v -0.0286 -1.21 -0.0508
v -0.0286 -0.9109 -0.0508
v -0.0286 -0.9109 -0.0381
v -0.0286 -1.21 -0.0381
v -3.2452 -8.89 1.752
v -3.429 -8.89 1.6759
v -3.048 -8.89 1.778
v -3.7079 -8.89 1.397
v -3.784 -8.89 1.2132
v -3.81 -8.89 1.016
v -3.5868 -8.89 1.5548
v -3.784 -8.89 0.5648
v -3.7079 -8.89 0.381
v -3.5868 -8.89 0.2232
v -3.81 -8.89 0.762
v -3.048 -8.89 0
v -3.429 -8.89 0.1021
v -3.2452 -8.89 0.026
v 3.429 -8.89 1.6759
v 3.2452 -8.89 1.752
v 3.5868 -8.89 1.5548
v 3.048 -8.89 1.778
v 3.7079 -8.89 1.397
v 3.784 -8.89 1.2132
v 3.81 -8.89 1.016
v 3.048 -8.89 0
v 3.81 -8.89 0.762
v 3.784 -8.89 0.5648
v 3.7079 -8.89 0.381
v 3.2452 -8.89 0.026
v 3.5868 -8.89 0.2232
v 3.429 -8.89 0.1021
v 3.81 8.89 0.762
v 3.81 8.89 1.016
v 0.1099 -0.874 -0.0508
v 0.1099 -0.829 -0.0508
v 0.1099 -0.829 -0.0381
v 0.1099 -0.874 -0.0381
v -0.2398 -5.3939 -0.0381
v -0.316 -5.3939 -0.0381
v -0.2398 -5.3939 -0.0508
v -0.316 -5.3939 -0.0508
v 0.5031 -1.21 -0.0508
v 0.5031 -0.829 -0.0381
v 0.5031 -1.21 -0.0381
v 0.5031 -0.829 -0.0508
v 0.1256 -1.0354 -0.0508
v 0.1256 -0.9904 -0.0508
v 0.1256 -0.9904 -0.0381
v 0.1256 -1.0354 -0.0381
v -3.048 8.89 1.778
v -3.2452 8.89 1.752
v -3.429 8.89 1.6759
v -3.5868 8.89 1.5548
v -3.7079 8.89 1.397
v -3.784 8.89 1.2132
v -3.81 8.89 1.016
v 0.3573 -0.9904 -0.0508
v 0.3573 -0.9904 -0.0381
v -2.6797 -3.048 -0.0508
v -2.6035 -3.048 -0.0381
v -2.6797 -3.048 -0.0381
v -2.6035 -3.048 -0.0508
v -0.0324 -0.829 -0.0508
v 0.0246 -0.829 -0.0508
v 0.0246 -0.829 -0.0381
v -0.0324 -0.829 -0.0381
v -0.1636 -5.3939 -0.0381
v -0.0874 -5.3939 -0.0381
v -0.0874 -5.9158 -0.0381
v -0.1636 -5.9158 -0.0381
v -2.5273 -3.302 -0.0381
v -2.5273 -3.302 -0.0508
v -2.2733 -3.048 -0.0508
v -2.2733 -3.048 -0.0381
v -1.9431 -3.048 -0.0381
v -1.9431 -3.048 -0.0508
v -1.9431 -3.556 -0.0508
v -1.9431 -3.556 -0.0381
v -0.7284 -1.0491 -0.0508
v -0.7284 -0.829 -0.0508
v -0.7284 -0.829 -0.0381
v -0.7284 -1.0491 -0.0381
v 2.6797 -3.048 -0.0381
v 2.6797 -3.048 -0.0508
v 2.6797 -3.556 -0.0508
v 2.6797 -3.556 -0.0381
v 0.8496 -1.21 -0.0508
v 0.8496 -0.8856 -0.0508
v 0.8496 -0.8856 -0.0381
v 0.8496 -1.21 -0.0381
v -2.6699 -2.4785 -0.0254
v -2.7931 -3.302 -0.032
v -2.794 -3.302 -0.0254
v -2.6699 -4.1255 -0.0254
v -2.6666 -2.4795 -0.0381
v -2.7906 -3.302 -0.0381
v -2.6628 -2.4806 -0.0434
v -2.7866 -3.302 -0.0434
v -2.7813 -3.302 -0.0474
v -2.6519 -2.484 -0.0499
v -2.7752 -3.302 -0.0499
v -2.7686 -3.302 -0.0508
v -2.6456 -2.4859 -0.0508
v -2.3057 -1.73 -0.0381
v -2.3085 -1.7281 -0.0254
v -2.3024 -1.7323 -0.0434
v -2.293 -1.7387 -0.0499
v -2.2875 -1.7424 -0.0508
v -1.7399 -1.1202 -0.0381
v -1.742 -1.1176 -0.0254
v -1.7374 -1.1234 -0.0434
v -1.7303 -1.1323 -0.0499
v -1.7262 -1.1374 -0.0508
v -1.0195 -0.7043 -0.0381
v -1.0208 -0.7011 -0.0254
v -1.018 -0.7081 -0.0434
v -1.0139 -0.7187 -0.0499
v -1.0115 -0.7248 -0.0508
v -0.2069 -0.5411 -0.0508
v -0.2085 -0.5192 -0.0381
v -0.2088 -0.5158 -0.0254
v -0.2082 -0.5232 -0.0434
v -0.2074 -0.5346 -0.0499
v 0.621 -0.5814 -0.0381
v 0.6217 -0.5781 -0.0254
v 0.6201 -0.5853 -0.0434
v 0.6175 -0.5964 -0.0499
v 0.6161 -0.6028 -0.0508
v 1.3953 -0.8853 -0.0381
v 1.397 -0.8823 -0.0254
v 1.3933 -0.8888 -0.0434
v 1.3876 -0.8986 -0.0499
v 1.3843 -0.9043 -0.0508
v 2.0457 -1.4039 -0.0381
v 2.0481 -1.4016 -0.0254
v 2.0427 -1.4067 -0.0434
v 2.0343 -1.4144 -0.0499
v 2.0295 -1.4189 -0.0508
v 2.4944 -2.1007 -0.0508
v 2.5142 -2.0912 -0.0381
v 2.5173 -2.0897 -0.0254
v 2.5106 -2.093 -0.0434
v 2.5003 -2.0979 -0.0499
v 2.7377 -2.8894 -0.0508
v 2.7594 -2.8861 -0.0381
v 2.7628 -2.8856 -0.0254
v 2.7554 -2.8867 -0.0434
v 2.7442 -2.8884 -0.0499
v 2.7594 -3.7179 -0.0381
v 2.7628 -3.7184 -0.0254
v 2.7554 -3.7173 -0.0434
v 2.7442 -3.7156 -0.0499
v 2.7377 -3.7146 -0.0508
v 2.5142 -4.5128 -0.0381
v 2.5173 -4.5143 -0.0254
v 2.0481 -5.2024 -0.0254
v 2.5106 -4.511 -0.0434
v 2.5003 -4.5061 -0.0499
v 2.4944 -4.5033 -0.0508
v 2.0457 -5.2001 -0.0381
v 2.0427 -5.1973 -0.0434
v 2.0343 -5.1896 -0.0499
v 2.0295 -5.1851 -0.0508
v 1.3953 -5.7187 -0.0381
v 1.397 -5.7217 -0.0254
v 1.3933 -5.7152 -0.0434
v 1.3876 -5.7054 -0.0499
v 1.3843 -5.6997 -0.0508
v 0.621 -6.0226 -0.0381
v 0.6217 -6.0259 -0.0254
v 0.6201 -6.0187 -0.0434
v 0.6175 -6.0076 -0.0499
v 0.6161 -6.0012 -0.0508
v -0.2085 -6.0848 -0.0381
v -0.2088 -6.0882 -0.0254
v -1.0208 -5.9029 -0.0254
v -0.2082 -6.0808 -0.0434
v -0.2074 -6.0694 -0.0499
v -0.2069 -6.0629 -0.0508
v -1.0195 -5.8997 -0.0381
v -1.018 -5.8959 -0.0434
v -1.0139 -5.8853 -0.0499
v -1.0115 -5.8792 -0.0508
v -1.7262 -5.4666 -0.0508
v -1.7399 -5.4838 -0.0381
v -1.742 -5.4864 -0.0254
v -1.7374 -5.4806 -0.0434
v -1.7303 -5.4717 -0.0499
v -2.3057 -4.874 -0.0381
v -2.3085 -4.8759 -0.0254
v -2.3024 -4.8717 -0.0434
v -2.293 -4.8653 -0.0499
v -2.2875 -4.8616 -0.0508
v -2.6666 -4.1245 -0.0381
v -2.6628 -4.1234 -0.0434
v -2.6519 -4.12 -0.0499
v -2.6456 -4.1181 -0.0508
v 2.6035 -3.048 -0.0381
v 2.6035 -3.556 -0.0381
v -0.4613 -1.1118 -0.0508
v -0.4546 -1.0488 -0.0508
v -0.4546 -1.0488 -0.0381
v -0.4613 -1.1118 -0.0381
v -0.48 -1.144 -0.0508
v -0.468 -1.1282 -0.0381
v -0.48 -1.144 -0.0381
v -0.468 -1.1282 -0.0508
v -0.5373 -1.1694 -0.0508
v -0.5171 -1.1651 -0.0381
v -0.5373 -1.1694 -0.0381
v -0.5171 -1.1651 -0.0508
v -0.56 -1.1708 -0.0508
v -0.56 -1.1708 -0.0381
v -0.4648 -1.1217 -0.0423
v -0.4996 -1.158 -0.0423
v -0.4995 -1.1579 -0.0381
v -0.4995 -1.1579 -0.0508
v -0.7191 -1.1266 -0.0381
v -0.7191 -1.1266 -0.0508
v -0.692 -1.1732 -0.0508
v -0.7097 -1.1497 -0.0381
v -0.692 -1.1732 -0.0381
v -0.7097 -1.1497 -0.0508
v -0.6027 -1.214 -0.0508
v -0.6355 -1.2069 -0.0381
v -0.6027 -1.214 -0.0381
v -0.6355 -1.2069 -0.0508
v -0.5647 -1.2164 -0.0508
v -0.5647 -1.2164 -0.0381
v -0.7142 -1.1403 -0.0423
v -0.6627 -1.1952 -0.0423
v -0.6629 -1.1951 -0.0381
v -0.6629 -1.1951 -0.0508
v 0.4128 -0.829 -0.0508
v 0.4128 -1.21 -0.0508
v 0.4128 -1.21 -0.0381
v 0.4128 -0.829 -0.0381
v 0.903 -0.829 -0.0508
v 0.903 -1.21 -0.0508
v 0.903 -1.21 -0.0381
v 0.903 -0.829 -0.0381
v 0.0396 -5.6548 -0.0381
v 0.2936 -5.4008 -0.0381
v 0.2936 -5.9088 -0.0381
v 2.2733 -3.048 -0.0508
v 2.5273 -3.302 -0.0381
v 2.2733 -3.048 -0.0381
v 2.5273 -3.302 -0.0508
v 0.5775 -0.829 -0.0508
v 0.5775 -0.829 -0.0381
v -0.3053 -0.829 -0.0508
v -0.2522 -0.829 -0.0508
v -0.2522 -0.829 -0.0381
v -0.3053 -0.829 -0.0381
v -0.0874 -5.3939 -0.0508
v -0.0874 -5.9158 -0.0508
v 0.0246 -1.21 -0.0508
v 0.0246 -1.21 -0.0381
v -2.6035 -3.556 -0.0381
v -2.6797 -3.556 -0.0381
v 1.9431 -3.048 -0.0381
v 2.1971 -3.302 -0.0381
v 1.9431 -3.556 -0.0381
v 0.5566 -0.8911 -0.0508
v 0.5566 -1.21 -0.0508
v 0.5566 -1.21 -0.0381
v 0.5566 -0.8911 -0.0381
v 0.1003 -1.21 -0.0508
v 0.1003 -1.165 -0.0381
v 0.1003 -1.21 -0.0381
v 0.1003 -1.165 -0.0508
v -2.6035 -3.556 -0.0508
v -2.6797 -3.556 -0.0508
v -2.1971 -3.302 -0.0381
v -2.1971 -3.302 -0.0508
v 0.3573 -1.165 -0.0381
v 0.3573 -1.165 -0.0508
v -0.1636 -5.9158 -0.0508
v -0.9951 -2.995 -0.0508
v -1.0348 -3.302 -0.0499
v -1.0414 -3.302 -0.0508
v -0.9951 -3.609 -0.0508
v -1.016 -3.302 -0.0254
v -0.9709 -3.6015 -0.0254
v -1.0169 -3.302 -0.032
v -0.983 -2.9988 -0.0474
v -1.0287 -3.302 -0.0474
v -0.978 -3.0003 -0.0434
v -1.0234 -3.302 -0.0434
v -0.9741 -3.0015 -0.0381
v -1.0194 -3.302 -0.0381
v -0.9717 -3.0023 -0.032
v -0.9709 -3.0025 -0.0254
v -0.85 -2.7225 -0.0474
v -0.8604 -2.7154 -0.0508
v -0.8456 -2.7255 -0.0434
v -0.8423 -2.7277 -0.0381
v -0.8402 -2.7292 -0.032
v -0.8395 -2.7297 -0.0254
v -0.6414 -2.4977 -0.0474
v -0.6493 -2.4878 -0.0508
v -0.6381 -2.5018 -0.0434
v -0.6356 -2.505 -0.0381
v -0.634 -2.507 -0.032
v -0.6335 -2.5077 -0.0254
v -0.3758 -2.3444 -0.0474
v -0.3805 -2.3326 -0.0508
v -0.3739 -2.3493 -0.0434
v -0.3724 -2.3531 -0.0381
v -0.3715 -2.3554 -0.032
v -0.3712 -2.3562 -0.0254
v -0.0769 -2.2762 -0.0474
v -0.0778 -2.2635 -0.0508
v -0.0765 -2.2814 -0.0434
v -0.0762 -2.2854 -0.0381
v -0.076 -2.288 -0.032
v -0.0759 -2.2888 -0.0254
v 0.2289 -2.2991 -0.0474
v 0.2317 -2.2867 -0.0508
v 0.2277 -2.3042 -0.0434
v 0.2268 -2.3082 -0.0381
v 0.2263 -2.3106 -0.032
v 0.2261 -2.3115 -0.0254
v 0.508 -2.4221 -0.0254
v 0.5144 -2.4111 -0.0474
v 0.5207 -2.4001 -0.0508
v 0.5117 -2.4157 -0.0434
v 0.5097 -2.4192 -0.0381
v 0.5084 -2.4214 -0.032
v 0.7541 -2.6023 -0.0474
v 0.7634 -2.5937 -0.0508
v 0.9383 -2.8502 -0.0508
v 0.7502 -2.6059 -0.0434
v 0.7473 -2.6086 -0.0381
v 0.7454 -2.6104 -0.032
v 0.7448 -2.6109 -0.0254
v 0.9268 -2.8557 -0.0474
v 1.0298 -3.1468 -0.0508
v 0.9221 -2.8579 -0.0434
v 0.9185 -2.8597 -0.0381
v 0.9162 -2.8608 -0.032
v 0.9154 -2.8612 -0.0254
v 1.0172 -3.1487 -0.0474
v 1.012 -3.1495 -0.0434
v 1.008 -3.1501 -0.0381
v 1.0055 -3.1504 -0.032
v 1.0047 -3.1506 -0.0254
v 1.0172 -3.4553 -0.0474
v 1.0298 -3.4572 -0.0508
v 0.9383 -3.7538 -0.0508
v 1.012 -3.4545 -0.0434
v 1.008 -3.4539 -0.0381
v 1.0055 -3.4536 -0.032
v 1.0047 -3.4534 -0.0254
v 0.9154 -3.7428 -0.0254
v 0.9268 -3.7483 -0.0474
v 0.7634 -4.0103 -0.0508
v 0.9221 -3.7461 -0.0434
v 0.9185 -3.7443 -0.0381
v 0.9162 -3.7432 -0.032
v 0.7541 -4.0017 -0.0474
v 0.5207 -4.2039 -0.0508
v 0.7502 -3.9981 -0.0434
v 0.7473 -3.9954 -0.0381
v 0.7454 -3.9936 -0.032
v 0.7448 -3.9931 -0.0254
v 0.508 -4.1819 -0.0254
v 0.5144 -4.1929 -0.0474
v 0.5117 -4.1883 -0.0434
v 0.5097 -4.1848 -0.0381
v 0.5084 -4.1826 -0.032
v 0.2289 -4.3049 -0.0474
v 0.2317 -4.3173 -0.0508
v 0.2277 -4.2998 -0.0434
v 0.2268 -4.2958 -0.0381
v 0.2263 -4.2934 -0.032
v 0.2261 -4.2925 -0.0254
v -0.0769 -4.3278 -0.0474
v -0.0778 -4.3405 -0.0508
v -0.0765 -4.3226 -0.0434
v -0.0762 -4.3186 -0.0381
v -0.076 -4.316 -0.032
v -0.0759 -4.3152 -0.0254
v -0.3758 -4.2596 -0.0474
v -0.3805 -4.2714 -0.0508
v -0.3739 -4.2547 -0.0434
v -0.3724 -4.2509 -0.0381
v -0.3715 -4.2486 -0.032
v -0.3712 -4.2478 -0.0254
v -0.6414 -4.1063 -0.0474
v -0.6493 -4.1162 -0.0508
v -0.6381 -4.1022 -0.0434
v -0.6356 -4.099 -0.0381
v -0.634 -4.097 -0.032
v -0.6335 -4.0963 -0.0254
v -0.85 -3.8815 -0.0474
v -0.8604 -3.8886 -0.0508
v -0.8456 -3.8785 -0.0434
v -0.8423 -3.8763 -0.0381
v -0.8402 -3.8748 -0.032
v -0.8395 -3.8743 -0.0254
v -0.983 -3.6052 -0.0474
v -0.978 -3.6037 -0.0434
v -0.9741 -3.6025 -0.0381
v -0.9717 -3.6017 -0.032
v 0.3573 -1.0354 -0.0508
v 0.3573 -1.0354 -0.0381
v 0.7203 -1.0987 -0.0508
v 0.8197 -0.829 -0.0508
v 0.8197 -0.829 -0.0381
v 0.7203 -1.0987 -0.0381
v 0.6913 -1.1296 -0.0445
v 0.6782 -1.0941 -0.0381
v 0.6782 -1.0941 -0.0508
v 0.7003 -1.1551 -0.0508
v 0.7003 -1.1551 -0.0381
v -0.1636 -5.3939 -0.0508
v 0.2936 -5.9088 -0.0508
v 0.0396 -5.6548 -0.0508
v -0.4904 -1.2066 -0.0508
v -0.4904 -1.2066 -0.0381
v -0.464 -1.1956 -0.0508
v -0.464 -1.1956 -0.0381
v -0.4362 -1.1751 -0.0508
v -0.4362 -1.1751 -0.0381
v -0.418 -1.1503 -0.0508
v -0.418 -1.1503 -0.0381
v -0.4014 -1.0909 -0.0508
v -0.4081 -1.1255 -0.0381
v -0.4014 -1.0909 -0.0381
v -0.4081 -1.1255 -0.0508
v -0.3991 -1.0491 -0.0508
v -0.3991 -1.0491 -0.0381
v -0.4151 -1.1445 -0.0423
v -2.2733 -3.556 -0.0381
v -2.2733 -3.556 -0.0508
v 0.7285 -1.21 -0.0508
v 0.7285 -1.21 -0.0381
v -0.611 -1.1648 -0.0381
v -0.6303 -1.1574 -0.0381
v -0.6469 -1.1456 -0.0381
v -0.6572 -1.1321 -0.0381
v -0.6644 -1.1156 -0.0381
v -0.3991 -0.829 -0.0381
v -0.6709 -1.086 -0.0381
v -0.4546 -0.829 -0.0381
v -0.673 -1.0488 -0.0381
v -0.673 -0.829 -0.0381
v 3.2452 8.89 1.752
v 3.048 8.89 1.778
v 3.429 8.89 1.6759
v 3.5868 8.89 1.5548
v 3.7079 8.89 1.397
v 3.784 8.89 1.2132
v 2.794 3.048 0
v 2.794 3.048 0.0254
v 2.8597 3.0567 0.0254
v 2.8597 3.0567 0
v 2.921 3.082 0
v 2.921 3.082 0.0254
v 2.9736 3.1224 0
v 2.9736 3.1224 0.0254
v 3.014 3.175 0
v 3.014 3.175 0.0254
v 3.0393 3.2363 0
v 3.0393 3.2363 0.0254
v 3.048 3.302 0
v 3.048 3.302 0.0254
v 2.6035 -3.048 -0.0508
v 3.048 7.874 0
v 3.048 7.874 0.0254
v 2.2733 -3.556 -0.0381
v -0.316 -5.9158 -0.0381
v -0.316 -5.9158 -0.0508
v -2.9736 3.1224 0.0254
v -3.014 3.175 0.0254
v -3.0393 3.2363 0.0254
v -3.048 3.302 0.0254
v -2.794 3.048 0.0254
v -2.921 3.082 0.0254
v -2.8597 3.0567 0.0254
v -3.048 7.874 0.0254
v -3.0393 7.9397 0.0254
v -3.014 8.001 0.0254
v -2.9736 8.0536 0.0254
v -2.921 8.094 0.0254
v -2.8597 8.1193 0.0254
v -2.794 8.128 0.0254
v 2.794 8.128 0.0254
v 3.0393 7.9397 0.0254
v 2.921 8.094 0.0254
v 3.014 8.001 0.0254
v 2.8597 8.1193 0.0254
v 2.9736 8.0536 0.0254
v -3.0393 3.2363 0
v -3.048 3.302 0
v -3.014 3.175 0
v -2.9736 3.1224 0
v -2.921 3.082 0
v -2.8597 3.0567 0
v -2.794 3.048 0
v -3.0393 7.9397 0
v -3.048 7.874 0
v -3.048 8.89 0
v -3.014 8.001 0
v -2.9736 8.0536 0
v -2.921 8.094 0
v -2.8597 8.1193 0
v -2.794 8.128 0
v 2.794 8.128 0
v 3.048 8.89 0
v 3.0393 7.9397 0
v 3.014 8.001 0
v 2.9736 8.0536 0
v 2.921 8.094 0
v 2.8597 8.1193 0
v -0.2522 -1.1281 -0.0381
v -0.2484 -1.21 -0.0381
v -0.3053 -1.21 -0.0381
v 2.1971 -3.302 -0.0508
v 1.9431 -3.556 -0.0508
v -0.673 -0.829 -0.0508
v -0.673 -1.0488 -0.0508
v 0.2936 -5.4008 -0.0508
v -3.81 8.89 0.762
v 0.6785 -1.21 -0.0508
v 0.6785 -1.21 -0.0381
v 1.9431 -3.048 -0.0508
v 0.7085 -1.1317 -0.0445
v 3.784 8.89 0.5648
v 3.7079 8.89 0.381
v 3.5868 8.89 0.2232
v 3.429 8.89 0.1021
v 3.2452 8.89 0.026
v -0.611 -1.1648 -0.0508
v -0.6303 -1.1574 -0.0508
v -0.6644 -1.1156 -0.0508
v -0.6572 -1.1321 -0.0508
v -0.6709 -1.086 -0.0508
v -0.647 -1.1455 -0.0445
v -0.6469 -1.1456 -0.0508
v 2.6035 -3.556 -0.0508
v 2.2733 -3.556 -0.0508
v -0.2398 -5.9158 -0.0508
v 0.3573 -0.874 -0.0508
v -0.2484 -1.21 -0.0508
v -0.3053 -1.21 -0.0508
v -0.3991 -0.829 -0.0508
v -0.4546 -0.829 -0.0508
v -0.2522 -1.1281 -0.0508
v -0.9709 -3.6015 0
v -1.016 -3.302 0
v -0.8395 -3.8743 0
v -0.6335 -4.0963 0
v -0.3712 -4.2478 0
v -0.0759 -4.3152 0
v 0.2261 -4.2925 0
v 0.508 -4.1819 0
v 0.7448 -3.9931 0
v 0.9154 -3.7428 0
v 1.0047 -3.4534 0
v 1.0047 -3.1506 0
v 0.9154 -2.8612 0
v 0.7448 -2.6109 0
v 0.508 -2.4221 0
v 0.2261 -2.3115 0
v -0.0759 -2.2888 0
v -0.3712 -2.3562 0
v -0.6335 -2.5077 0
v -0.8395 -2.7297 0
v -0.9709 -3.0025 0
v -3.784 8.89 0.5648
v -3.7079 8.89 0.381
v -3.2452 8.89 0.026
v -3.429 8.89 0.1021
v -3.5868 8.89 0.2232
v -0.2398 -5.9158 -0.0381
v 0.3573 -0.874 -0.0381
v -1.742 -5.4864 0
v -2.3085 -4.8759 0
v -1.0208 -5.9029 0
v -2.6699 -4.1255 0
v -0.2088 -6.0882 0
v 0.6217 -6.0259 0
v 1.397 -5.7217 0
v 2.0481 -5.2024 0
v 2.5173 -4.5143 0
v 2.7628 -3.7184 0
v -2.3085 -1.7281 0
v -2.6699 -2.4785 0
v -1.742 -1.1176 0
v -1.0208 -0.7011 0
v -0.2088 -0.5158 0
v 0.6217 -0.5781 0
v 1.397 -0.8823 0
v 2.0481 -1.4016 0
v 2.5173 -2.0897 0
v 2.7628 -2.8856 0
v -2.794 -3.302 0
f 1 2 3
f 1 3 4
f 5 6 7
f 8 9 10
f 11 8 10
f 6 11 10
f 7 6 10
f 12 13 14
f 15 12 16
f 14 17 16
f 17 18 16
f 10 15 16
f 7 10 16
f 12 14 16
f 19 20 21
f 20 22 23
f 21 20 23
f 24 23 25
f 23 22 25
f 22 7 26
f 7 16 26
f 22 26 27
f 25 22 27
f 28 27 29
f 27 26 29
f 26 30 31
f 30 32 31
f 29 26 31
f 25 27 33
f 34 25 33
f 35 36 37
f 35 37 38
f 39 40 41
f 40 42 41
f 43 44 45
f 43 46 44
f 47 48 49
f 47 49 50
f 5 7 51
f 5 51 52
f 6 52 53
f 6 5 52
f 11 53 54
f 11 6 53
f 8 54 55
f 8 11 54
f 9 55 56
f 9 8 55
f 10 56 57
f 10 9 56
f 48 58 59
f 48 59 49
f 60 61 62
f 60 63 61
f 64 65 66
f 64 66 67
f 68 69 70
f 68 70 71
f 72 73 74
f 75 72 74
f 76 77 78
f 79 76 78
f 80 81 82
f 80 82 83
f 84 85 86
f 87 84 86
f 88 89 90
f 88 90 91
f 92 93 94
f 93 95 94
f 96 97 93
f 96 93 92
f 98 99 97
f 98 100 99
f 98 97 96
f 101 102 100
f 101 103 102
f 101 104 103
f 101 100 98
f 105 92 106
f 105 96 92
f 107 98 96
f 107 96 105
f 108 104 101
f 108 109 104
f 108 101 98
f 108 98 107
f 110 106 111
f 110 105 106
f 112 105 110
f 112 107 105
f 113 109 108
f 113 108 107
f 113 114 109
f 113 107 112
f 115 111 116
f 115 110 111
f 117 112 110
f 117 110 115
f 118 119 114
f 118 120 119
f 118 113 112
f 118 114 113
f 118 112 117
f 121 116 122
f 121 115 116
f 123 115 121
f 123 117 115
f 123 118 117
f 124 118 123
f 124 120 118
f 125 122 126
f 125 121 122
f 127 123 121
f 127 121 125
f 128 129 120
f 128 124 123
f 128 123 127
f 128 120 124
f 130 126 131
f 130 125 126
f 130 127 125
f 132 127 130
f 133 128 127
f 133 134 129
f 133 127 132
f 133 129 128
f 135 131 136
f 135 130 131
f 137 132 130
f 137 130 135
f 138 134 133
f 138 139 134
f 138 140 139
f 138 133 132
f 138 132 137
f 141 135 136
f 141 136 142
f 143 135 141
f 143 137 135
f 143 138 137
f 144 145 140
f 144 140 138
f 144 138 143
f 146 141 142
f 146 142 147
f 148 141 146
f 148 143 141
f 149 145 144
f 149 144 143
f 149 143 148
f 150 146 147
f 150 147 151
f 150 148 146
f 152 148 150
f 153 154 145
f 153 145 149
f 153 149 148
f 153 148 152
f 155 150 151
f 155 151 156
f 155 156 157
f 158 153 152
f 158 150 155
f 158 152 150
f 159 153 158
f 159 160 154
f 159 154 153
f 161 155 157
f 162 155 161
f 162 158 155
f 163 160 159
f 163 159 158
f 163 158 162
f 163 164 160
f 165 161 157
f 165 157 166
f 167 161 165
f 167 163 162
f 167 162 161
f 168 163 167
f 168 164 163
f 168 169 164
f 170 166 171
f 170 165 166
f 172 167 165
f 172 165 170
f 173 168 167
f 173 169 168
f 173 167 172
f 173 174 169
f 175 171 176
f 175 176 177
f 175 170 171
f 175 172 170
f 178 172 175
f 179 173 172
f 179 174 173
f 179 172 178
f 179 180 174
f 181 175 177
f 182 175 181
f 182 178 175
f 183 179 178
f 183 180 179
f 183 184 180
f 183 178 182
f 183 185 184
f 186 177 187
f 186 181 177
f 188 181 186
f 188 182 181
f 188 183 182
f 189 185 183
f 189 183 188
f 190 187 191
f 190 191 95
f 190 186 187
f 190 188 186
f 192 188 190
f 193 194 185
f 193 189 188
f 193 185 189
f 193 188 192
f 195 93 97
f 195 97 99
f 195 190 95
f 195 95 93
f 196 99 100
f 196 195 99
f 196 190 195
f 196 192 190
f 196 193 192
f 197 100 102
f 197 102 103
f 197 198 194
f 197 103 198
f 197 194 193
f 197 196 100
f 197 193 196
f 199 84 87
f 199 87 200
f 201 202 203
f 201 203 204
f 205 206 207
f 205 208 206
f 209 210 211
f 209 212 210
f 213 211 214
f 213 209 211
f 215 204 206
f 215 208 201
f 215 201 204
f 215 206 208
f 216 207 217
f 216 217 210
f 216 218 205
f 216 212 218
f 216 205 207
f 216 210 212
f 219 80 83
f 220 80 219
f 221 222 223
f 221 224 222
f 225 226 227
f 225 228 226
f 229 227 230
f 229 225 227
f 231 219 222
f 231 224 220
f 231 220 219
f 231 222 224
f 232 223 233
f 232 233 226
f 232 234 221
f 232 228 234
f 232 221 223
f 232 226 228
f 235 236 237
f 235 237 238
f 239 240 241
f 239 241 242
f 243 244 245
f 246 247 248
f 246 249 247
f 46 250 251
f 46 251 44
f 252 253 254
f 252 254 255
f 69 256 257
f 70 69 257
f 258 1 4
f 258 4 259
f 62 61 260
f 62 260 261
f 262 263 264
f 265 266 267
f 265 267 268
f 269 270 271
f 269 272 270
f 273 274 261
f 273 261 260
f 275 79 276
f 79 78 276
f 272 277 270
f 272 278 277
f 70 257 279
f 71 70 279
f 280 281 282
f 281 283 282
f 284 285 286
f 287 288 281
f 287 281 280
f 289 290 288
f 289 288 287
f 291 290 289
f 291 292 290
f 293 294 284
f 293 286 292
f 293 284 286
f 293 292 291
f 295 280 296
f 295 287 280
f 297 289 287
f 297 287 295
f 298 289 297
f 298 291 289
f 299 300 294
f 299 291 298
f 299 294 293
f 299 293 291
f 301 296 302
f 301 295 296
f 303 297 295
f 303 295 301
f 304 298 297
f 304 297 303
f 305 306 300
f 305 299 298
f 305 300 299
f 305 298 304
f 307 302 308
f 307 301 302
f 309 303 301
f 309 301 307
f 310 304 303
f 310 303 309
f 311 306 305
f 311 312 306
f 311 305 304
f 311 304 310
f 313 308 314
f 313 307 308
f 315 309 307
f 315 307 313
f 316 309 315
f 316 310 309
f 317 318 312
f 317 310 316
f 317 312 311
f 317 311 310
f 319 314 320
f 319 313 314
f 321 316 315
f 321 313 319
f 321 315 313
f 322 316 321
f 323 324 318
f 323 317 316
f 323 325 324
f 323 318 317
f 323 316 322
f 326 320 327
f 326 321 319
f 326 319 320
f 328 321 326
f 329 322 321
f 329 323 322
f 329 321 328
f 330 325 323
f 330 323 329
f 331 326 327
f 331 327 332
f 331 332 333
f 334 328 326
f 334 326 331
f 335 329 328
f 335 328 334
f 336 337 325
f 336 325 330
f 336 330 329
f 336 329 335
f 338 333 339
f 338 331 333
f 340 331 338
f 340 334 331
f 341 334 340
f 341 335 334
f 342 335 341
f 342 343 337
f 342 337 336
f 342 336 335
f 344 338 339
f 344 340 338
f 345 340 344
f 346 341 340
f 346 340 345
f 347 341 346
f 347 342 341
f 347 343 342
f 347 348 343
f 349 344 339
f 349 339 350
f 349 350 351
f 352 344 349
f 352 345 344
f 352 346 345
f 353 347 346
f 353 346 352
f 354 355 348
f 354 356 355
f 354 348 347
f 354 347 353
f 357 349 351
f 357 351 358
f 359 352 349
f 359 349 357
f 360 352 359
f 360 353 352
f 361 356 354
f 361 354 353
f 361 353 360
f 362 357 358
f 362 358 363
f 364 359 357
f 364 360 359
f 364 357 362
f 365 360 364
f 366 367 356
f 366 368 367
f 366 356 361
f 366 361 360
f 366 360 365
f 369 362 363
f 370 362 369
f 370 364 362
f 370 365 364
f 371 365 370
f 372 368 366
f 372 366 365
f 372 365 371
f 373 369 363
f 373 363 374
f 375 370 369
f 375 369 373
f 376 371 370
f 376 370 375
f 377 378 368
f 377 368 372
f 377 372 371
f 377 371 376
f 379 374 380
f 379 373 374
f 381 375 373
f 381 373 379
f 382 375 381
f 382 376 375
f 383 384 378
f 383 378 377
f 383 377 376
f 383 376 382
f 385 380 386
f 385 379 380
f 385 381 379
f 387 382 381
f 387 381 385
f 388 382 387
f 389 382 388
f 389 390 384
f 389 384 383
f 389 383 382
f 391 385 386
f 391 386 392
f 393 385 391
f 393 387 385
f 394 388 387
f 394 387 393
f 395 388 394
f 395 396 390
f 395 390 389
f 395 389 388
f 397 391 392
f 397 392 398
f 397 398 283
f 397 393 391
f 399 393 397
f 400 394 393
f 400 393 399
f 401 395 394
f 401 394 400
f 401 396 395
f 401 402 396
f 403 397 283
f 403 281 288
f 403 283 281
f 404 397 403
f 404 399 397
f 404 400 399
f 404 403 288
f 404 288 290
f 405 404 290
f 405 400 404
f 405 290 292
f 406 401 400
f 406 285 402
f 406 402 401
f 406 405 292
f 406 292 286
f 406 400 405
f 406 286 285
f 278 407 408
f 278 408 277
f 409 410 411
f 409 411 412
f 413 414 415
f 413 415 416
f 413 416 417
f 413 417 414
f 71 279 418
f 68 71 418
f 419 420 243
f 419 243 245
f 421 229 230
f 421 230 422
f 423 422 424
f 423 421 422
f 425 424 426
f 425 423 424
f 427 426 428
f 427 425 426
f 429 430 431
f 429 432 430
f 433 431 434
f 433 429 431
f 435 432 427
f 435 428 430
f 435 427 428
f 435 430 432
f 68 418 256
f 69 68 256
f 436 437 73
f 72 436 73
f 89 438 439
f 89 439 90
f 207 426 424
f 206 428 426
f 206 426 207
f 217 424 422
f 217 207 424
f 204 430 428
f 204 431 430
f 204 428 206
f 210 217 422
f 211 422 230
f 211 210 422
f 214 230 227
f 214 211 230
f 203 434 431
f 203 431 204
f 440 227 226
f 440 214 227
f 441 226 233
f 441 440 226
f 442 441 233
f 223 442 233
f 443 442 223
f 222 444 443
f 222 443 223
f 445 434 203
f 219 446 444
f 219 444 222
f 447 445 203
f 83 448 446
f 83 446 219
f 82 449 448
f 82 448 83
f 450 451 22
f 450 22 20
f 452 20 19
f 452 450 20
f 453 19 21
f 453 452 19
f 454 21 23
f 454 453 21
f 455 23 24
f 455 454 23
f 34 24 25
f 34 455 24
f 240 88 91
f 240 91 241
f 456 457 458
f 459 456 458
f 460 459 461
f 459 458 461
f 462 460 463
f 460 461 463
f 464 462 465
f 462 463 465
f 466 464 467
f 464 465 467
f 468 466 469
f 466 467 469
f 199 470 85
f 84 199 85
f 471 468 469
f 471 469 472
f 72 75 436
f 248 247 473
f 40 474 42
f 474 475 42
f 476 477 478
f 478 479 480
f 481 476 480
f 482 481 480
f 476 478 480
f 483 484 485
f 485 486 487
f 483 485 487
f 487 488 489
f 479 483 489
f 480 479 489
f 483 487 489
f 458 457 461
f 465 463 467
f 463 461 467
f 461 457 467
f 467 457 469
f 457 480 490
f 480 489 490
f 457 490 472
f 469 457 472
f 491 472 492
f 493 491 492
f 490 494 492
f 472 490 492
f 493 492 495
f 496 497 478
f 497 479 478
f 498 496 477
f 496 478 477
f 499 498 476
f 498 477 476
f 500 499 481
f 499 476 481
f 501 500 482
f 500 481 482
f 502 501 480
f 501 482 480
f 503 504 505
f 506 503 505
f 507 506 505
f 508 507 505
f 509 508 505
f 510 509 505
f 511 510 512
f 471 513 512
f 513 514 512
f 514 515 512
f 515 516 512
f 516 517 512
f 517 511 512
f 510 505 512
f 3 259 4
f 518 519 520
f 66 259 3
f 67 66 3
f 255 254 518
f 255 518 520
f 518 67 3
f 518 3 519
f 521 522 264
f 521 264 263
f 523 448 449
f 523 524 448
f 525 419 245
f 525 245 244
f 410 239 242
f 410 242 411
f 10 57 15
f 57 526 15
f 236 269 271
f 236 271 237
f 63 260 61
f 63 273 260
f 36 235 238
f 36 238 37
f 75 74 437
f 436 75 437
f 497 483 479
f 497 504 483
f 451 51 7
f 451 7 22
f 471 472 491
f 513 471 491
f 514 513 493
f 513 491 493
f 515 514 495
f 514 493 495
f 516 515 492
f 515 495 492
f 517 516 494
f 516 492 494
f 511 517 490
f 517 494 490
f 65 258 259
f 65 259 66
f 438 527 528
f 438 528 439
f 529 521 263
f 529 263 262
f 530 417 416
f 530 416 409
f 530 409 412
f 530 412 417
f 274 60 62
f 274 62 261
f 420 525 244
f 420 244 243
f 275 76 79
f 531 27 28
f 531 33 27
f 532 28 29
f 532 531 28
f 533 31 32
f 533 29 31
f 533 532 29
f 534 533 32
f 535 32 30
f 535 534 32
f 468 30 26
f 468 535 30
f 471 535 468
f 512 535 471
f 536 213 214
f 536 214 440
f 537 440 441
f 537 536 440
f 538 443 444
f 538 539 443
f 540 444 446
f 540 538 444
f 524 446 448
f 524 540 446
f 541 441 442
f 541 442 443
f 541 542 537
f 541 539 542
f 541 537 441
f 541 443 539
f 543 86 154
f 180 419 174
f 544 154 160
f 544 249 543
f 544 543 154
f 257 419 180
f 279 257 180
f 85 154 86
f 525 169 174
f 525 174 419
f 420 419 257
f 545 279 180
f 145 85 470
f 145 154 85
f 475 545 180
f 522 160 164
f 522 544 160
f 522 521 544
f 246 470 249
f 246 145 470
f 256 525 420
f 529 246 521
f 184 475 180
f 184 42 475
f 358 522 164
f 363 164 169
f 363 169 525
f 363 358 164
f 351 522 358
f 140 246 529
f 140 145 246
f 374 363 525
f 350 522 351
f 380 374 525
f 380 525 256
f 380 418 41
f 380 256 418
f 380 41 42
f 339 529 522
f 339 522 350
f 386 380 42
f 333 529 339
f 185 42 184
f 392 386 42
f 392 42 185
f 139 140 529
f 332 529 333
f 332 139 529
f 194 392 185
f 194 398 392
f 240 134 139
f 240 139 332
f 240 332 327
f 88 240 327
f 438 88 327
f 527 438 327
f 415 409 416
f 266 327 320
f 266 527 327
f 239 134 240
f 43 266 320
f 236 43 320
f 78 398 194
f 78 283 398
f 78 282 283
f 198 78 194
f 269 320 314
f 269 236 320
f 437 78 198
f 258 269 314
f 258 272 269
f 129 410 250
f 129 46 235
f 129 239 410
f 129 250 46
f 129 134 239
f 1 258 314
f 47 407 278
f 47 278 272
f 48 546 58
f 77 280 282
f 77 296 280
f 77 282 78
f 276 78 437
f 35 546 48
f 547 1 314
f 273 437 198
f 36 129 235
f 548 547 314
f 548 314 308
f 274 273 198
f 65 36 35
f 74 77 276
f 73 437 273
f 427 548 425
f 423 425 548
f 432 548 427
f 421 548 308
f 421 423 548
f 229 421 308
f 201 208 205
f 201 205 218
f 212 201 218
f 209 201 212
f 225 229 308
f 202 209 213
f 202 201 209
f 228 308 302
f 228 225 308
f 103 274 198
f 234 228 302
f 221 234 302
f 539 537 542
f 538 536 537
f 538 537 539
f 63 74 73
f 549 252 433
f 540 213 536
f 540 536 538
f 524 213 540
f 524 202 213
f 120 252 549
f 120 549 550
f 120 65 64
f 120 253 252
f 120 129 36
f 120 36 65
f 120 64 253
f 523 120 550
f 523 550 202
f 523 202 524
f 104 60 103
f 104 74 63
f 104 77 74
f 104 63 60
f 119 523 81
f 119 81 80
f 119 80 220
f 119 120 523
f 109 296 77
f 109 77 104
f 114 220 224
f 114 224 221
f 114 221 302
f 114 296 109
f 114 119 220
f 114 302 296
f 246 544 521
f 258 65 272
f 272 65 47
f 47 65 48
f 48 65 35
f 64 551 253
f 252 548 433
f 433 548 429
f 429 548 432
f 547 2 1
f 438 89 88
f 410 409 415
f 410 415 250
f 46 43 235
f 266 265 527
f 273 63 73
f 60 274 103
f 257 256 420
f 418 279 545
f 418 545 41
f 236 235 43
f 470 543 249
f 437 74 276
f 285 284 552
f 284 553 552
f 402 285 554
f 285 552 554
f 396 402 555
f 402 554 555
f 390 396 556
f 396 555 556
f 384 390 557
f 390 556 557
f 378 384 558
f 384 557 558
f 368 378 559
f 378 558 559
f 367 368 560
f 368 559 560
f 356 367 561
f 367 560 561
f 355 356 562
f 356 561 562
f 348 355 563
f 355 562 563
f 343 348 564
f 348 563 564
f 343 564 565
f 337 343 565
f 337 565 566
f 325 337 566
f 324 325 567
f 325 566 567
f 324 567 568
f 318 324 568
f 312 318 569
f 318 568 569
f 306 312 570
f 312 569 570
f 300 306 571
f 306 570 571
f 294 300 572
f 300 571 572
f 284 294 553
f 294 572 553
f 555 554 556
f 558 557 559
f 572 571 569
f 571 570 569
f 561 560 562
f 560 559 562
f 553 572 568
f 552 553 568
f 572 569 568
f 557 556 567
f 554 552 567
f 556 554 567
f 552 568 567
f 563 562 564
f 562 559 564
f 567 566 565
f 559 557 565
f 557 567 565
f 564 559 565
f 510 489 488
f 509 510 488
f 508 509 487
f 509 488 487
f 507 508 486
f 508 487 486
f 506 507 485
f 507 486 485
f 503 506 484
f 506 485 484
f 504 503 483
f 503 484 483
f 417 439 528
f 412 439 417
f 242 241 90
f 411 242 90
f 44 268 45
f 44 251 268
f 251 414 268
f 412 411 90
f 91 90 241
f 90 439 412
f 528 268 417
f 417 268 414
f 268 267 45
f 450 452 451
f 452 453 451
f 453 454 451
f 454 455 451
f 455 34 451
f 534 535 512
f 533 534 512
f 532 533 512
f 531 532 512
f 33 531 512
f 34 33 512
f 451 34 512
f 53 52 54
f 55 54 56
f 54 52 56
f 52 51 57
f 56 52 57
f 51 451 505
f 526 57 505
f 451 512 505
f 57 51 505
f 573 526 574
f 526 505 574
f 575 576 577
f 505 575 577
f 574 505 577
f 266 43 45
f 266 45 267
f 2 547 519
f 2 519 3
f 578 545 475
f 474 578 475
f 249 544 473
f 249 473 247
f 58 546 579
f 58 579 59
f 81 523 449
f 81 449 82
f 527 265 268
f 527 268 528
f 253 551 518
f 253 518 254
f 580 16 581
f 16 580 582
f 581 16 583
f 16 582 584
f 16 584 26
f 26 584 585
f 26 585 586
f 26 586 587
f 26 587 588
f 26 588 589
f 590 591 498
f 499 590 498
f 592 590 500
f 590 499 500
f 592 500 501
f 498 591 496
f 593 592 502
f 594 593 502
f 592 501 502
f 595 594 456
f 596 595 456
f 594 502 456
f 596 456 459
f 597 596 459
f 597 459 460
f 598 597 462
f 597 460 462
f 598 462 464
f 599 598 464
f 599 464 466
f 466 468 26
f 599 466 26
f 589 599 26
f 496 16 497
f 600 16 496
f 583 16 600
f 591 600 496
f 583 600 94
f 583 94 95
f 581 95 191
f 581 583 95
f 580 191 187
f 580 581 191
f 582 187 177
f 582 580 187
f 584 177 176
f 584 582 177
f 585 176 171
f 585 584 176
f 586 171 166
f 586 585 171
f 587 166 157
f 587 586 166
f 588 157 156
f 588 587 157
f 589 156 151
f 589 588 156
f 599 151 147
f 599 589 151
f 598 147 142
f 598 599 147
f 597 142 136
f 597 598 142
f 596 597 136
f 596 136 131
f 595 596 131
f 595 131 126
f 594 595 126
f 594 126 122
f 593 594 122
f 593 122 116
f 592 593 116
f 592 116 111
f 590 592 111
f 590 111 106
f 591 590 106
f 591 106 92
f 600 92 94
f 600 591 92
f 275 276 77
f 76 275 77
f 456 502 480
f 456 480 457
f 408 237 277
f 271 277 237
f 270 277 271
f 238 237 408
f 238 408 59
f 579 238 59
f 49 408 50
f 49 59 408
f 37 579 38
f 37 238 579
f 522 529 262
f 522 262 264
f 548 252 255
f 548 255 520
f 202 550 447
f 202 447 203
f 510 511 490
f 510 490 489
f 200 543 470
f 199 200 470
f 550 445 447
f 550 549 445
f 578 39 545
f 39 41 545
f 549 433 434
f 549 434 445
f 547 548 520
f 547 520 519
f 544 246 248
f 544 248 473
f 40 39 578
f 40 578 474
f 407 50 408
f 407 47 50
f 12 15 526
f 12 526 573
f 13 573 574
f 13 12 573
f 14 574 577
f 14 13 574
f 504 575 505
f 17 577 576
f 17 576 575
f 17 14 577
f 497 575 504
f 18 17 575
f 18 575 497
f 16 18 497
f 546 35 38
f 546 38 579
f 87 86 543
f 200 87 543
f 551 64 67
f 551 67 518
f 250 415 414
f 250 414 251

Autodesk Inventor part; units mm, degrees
ref_plane "YZ Plane" through (0, 0, 0) normal (1, 0, 0) x (0, 1, 0)
ref_plane "XZ Plane" through (0, 0, 0) normal (0, 1, 0) x (-1, 0, 0)
ref_plane "XY Plane" through (0, 0, 0) normal (0, 0, 1) x (1, 0, 0)
sketch "Sketch1" plane through (0, 0, 0) normal (0, 0, 1) x (1, 0, 0)
  line L0 (-3.81, -8.89) -> (3.81, -8.89)
  line L1 (3.81, -8.89) -> (3.81, 8.89)
  line L2 (3.81, 8.89) -> (-3.81, 8.89)
  line L3 (-3.81, 8.89) -> (-3.81, -8.89)
  line L4 (-3.81, -8.89) -> (3.81, 8.89) construction
  line L5 (3.81, -8.89) -> (-3.81, 8.89) construction
  line L6 (-3.048, 3.048) -> (3.048, 3.048)
  line L7 (3.048, 3.048) -> (3.048, 8.128)
  line L8 (3.048, 8.128) -> (-3.048, 8.128)
  line L9 (-3.048, 8.128) -> (-3.048, 3.048)
  line L10 (-3.048, 3.048) -> (3.048, 8.128) construction
  line L11 (3.048, 3.048) -> (-3.048, 8.128) construction
  circle A0 centre (0, -3.302) radius 2.794
  point P0 (0, 0)
  point P1 (0, 5.588)
  dimension "d0" = 7.62
  dimension "d1" = 17.78
  dimension "d2" = 0.762
  dimension "d3" = 0.762
  dimension "d4" = 0.762
  dimension "d5" = 5.08
  dimension "d6" = 5.588
  dimension "d7" = 5.588
extrude "Extrusion1" add sketch "Sketch1" along normal blind 1.778 contours L3 L2 L1 L0 | L9 L8 L7 L6 | A0
fillet "Fillet1" radius 0.762 4 edges at (3.81, 0, 0) (3.81, 0, 1.778) (-3.81, 0, 1.778) (-3.81, 0, 0)
extrude "Extrusion2" cut sketch "Sketch1" along normal blind 0.0254 contours L9 L8 L7 L6
fillet "Fillet2" radius 0.254 4 edges at (3.048, 8.128, 0.0127) (-3.048, 8.128, 0.0127) (3.048, 3.048, 0.0127) (-3.048, 3.048, 0.0127)
sketch "Sketch2" plane through (0, 0, 0) normal (0, 0, -1) x (-1, 0, 0)
  circle A0 centre (0, -3.302) radius 1.016
  circle A1 centre (0, -3.302) radius 2.794 projected
  point P0 (0, 0)
  dimension "d14" = 2.032
extrude "Extrusion3" add sketch "Sketch2" along normal blind 0.0508
fillet "Fillet3" radius 0.0254 2 edges at (1.016, -3.302, -0.0508) (2.794, -3.302, -0.0508)
sketch "Sketch3" plane through (0, -3.302, -0.0508) normal (0, 0, -1) x (-1, 0, 0)
  line L0 (-0.9463, 2.473) -> (1.05, 2.473) construction
  line L1 (1.05, 2.473) -> (1.05, 1.9797) construction
  line L2 (1.05, 1.9797) -> (-0.9463, 1.9797) construction
  line L3 (-0.9463, 1.9797) -> (-0.9463, 2.473) construction
  line L4 (-2.6797, -0.254) -> (-2.6035, -0.254)
  line L5 (-2.6035, -0.254) -> (-2.6035, 0.254)
  line L6 (-2.6035, 0.254) -> (-2.6797, 0.254)
  line L7 (-2.6797, 0.254) -> (-2.6797, -0.254)
  line L8 (-2.6797, -0.254) -> (-2.6035, 0.254) construction
  line L9 (-2.6035, -0.254) -> (-2.6797, 0.254) construction
  line L10 (0, 0) -> (0, 3.302) construction
  line L11 (-2.5273, 0) -> (-2.2733, 0.254)
  line L12 (-2.2733, 0.254) -> (-2.2733, -0.254)
  line L13 (-2.2733, -0.254) -> (-2.5273, 0)
  line L14 (-2.1971, 0) -> (-1.9431, 0.254)
  line L15 (-1.9431, 0.254) -> (-1.9431, -0.254)
  line L16 (-3.048, 12.192) -> (-3.048, -5.588) projected
  line L17 (-1.9431, -0.254) -> (-2.1971, 0)
  line L18 (2.6797, -0.254) -> (2.6035, -0.254)
  line L19 (2.6035, -0.254) -> (2.6035, 0.254)
  line L20 (2.6035, 0.254) -> (2.6797, 0.254)
  line L21 (2.6797, 0.254) -> (2.6797, -0.254)
  line L22 (2.6797, -0.254) -> (2.6035, 0.254) construction
  line L23 (2.6035, -0.254) -> (2.6797, 0.254) construction
  line L24 (2.5273, 0) -> (2.2733, 0.254)
  line L25 (2.2733, 0.254) -> (2.2733, -0.254)
  line L26 (2.2733, -0.254) -> (2.5273, 0)
  line L27 (2.1971, 0) -> (1.9431, 0.254)
  line L28 (1.9431, 0.254) -> (1.9431, -0.254)
  line L29 (1.9431, -0.254) -> (2.1971, 0)
  line L30 (-0.2936, -2.0988) -> (-0.0396, -2.3528)
  line L31 (-0.0396, -2.3528) -> (-0.2936, -2.6068)
  line L32 (-0.2936, -2.6068) -> (-0.2936, -2.0988)
  line L33 (0.0874, -2.6138) -> (0.1636, -2.6138)
  line L34 (0.1636, -2.6138) -> (0.1636, -2.0919)
  line L35 (0.1636, -2.0919) -> (0.0874, -2.0919)
  line L36 (0.0874, -2.0919) -> (0.0874, -2.6138)
  line L37 (0.0874, -2.6138) -> (0.1636, -2.0919) construction
  line L38 (0.1636, -2.6138) -> (0.0874, -2.0919) construction
  line L39 (0.2398, -2.6138) -> (0.316, -2.6138)
  line L40 (0.316, -2.6138) -> (0.316, -2.0919)
  line L41 (0.316, -2.0919) -> (0.2398, -2.0919)
  line L42 (0.2398, -2.0919) -> (0.2398, -2.6138)
  line L43 (0.2398, -2.6138) -> (0.316, -2.0919) construction
  line L44 (0.316, -2.6138) -> (0.2398, -2.0919) construction
  line L45 (-2.6416, 0) -> (0, 0) construction
  line L46 (-0.903, 2.092) -> (-0.903, 2.473)
  line L47 (-0.903, 2.473) -> (-0.8197, 2.473)
  line L48 (-0.8197, 2.473) -> (-0.7203, 2.2033)
  spline S0 degree 2 poles (-0.7203, 2.2033) (-0.7067, 2.1655) (-0.7003, 2.1469) knots 0 0 0 1 1 1
  spline S1 degree 2 poles (-0.7003, 2.1469) (-0.6933, 2.1675) (-0.6782, 2.2079) knots 0 0 0 1 1 1
  line L49 (-0.6782, 2.2079) -> (-0.5775, 2.473)
  line L50 (-0.5775, 2.473) -> (-0.5031, 2.473)
  line L51 (-0.5031, 2.473) -> (-0.5031, 2.092)
  line L52 (-0.5031, 2.092) -> (-0.5566, 2.092)
  line L53 (-0.5566, 2.092) -> (-0.5566, 2.4109)
  line L54 (-0.5566, 2.4109) -> (-0.6785, 2.092)
  line L55 (-0.6785, 2.092) -> (-0.7285, 2.092)
  line L56 (-0.7285, 2.092) -> (-0.8496, 2.4164)
  line L57 (-0.8496, 2.4164) -> (-0.8496, 2.092)
  line L58 (-0.8496, 2.092) -> (-0.903, 2.092)
  line L59 (-0.4128, 2.092) -> (-0.4128, 2.473)
  line L60 (-0.4128, 2.473) -> (-0.1099, 2.473)
  line L61 (-0.1099, 2.473) -> (-0.1099, 2.428)
  line L62 (-0.1099, 2.428) -> (-0.3573, 2.428)
  line L63 (-0.3573, 2.428) -> (-0.3573, 2.3116)
  line L64 (-0.3573, 2.3116) -> (-0.1256, 2.3116)
  line L65 (-0.1256, 2.3116) -> (-0.1256, 2.2666)
  line L66 (-0.1256, 2.2666) -> (-0.3573, 2.2666)
  line L67 (-0.3573, 2.2666) -> (-0.3573, 2.137)
  line L68 (-0.3573, 2.137) -> (-0.1003, 2.137)
  line L69 (-0.1003, 2.137) -> (-0.1003, 2.092)
  line L70 (-0.1003, 2.092) -> (-0.4128, 2.092)
  line L71 (-0.0246, 2.092) -> (-0.0246, 2.473)
  line L72 (-0.0246, 2.473) -> (0.0324, 2.473)
  line L73 (0.0324, 2.473) -> (0.2522, 2.1739)
  line L74 (0.2522, 2.1739) -> (0.2522, 2.473)
  line L75 (0.2522, 2.473) -> (0.3053, 2.473)
  line L76 (0.3053, 2.473) -> (0.3053, 2.092)
  line L77 (0.3053, 2.092) -> (0.2484, 2.092)
  line L78 (0.2484, 2.092) -> (0.0286, 2.3911)
  line L79 (0.0286, 2.3911) -> (0.0286, 2.092)
  line L80 (0.0286, 2.092) -> (-0.0246, 2.092)
  line L81 (0.673, 2.473) -> (0.7284, 2.473)
  line L82 (0.7284, 2.473) -> (0.7284, 2.2529)
  spline S2 degree 2 poles (0.7284, 2.2529) (0.7284, 2.1954) (0.7, 2.128) (0.6254, 2.0856) (0.5647, 2.0856) knots 0 0 0 1 2 3 3 3
  spline S3 degree 2 poles (0.5647, 2.0856) (0.506, 2.0856) (0.4311, 2.1225) (0.3991, 2.1925) (0.3991, 2.2529) knots 0 0 0 1 2 3 3 3
  line L83 (0.3991, 2.2529) -> (0.3991, 2.473)
  line L84 (0.3991, 2.473) -> (0.4546, 2.473)
  line L85 (0.4546, 2.473) -> (0.4546, 2.2532)
  spline S4 degree 2 poles (0.4546, 2.2532) (0.4546, 2.2038) (0.4749, 2.1568) (0.5243, 2.1312) (0.56, 2.1312) knots 0 0 0 1 2 3 3 3
  spline S5 degree 2 poles (0.56, 2.1312) (0.621, 2.1312) (0.673, 2.1818) (0.673, 2.2532) knots 0 0 0 1 2 2 2
  line L86 (0.673, 2.2532) -> (0.673, 2.473)
  point P0 (2.6416, 0)
  point P1 (0.1255, -2.3528)
  point P2 (0.2779, -2.3528)
  dimension "d18" = 0.254
  dimension "d19" = 0.254
  dimension "d22" = 0.508
  dimension "d23" = 0.254
  dimension "d24" = 3.302
  dimension "d25" = 2.6416
  dimension "d26" = 0.0762
  dimension "d27" = 0.0762
  dimension "d28" = 0.0762
  dimension "d29" = 0.254
  dimension "d30" = 0.508
  dimension "d31" = 0.254
  dimension "d32" = 0.127
  dimension "d33" = 0.0762
  dimension "d34" = 0.0762
extrude "Extrusion4" cut sketch "Sketch3" against normal blind 0.0127
properties part number "iPod Nano"
